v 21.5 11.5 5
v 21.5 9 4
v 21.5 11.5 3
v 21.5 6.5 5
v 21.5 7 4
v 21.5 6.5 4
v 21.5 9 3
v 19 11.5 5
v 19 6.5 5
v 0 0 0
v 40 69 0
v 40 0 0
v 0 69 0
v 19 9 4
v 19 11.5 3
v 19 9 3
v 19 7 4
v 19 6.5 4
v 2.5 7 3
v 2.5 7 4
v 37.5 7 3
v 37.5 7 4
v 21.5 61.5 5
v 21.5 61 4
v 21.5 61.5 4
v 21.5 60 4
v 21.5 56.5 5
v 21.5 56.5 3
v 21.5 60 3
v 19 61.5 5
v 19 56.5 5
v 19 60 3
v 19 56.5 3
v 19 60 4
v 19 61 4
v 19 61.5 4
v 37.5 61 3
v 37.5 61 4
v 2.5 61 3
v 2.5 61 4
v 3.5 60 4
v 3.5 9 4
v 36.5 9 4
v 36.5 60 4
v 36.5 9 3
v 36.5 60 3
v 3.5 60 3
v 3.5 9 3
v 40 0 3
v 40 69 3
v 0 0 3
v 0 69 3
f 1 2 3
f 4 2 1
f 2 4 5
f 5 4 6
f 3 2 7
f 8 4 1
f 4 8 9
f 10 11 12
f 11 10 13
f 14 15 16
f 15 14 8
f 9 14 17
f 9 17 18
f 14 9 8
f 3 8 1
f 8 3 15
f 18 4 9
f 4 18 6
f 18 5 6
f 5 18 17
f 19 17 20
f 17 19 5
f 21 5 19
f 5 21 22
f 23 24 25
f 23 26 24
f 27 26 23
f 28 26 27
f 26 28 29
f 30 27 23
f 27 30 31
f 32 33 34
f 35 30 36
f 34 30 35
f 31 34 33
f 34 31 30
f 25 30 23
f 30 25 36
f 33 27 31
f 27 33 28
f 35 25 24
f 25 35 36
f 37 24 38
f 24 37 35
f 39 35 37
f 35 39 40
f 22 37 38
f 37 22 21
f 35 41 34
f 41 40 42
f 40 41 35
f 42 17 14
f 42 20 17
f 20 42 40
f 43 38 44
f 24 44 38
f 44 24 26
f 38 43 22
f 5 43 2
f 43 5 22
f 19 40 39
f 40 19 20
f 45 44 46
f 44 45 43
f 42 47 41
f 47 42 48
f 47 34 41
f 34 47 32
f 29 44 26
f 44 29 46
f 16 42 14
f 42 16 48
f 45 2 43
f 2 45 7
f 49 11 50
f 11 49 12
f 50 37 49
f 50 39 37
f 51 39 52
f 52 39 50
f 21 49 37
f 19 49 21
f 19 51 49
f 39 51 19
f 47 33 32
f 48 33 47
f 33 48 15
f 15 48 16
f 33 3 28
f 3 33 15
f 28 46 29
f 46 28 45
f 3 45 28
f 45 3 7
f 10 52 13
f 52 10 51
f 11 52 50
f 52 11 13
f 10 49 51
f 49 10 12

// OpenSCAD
/*
    TOS Version 1 Bottom
    

*/

//Body
cube([40,69,3]);

// Clasp front
difference() {
    translate([19.0,6.5,0]) {
        cube([2.5,5,5]);
    };
    translate([19.0,6,0]) {
        cube([5,1,4]);
    }    
}

// Clasp back
difference() {
    translate([19.0,56.5,0]) {
        cube([2.5,5,5]);
    };
    translate([19.0,61,0]) {
        cube([5,1,4]);
    }    
}

// Clasp left
/*
difference() {
    translate([2.0,32.5,0]) {
        cube([2.5,4,5]);
    };
    translate([0,32.5,-1]) {
        cube([2.5,4,5]);
    }    
}
*/




//Lip
difference() {
    translate([2.5,7,0]) {
            cube([35, 54, 4]);
    }

    translate([3.5,9,0]) {
            cube([33, 51, 4]);
    }
}
